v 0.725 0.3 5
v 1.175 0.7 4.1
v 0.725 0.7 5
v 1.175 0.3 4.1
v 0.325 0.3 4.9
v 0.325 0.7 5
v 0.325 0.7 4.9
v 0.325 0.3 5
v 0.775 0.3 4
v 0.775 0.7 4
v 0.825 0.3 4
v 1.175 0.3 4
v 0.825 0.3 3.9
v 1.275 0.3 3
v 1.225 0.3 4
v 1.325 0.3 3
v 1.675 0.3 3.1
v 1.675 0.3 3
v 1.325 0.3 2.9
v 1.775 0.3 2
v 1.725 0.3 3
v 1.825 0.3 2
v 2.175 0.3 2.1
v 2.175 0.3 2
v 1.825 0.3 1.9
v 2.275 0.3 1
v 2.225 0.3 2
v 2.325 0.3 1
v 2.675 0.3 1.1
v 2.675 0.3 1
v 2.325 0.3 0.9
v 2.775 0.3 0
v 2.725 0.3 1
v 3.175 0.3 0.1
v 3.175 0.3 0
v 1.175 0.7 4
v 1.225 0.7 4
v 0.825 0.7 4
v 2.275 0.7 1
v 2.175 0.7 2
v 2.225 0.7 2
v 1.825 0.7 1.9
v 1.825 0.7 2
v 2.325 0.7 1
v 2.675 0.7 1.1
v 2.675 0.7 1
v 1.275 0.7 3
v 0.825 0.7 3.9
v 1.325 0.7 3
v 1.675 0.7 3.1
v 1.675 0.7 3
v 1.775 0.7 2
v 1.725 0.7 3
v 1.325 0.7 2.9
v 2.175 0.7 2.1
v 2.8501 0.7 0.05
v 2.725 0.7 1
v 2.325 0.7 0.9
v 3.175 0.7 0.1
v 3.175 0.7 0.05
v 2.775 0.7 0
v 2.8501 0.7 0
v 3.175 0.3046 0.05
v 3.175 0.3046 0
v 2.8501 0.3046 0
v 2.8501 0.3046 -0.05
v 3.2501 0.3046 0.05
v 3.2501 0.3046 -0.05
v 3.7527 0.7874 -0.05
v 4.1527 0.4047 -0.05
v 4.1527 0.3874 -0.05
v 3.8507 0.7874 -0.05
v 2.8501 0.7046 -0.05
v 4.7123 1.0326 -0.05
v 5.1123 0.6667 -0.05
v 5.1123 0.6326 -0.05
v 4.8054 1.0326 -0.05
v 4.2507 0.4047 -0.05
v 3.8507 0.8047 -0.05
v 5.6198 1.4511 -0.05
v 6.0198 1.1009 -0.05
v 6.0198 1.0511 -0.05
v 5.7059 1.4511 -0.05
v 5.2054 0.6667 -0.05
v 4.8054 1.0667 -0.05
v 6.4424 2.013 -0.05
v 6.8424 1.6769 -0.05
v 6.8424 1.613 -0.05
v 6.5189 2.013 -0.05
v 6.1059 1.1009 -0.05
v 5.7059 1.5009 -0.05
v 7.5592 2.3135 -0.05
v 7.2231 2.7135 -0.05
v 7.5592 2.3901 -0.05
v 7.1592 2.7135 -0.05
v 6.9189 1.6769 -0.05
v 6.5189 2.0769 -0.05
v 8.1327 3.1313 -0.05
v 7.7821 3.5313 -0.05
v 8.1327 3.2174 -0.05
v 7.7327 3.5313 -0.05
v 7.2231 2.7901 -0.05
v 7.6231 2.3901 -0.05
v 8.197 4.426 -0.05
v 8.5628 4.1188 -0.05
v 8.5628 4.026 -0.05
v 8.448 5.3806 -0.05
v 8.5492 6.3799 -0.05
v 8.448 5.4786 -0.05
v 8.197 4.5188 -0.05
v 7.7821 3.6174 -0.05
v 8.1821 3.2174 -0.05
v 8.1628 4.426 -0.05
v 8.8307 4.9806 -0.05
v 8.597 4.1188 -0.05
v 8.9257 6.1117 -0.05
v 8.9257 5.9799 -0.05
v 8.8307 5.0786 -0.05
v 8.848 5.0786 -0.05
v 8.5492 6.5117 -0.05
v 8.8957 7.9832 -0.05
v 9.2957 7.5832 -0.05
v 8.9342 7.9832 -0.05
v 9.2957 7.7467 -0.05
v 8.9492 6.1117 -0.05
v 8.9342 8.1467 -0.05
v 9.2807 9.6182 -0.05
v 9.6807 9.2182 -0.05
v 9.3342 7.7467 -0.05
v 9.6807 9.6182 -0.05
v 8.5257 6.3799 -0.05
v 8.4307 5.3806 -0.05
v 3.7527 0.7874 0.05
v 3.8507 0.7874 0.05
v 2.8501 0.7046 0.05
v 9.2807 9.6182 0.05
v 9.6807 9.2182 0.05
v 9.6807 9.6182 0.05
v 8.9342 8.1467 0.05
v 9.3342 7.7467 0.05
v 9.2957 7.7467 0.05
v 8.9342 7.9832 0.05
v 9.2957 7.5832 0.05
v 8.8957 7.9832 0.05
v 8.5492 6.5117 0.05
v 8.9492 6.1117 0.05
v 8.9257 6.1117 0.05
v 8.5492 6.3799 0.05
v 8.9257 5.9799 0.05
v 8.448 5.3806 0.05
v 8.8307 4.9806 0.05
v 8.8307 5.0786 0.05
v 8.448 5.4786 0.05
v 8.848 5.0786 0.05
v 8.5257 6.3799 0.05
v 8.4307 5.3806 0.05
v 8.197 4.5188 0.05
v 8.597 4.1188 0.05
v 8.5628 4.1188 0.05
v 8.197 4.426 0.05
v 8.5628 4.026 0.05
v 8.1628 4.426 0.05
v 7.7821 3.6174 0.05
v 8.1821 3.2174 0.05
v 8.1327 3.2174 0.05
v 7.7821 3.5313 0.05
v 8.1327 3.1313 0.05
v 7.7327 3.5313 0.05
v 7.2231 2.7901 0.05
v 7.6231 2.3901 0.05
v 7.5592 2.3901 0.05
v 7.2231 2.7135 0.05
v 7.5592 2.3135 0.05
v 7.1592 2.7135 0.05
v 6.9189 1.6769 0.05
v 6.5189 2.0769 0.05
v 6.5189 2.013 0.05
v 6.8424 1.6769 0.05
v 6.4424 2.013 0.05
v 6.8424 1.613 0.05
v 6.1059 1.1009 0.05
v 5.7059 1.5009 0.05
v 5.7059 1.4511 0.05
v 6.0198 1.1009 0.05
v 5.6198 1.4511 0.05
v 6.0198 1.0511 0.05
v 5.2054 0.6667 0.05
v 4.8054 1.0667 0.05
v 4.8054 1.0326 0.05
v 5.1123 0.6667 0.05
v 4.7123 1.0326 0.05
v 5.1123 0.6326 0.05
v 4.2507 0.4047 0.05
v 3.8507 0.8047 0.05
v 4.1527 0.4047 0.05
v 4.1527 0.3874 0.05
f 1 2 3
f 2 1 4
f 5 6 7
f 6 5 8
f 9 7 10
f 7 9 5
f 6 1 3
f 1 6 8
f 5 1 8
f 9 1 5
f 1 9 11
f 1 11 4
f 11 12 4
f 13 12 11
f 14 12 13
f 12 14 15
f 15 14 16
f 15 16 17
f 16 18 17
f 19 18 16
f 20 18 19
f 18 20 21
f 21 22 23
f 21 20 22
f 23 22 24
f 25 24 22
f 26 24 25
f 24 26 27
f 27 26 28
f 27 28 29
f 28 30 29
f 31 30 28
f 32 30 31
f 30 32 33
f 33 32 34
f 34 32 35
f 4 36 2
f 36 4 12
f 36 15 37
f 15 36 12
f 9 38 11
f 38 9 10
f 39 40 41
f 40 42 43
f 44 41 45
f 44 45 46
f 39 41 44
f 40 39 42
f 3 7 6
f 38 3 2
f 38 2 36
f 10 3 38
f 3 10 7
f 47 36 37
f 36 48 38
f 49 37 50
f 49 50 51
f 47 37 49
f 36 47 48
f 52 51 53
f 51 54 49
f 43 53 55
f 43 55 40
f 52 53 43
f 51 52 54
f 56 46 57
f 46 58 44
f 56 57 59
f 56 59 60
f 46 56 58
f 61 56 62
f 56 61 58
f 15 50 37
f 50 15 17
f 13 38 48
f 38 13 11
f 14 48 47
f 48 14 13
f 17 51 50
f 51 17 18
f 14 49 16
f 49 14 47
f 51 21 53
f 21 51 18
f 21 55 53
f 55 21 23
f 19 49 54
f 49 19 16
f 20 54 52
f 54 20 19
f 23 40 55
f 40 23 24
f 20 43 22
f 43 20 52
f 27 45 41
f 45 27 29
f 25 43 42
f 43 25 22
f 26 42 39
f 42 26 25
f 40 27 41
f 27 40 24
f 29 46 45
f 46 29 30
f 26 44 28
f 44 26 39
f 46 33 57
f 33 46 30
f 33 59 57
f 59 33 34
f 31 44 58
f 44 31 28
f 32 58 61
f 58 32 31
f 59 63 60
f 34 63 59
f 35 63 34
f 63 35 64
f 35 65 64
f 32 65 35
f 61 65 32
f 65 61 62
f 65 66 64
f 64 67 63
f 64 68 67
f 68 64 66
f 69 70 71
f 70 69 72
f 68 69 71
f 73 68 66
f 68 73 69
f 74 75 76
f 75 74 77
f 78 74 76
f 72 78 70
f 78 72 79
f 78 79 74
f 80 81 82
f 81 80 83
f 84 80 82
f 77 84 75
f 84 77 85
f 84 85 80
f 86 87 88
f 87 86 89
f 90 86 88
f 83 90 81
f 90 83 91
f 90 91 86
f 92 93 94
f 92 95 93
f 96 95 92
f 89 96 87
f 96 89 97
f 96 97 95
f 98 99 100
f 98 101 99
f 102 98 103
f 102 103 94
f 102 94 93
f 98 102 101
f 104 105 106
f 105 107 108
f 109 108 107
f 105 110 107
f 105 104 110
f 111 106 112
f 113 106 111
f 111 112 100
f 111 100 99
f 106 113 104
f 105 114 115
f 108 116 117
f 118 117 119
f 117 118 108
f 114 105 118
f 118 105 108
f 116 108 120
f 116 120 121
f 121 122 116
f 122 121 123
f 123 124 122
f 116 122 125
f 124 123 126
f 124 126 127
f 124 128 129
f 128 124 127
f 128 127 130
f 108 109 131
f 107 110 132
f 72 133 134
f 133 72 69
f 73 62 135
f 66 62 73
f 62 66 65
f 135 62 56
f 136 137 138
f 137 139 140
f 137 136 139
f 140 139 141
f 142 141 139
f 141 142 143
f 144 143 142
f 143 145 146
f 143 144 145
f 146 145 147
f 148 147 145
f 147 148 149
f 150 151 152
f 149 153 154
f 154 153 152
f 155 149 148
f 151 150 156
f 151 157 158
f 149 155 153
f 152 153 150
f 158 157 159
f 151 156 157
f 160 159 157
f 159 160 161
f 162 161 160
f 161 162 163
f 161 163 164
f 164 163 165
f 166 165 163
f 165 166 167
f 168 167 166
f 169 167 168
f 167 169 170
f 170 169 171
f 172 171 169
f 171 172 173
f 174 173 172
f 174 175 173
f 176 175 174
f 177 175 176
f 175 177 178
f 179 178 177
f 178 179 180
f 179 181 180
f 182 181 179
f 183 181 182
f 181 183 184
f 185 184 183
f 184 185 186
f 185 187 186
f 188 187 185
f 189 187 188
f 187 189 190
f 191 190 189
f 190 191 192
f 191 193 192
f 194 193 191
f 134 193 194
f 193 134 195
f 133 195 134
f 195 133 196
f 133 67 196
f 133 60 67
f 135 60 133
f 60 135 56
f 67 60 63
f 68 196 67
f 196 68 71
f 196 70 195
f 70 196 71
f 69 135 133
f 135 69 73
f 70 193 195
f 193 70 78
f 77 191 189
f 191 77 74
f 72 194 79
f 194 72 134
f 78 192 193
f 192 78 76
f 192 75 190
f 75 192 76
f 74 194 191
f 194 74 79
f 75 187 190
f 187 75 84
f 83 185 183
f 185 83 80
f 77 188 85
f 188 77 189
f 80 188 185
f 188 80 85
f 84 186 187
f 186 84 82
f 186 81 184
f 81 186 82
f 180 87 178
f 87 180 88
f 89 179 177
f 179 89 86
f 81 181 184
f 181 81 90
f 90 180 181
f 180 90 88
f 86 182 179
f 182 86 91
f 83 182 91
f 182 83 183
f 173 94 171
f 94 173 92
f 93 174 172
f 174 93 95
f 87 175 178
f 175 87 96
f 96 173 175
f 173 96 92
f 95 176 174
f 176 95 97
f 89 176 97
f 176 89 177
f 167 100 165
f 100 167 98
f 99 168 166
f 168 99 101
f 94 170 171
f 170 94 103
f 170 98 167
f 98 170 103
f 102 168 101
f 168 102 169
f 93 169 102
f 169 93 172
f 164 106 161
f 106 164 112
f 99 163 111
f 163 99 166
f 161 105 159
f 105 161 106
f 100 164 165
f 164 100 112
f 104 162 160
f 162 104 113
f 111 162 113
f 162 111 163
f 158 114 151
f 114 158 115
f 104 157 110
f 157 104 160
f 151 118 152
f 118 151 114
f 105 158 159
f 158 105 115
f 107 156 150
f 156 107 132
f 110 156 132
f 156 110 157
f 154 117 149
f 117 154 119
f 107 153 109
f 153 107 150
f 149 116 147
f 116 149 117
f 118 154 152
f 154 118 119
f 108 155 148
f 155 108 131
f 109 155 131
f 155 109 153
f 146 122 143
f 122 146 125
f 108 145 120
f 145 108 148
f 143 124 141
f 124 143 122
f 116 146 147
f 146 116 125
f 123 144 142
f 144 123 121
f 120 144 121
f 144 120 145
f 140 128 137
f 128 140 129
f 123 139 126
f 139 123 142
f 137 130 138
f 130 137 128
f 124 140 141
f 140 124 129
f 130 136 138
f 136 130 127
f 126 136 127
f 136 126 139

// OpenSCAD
hull() {
    translate([0.525, 0.5, 4.95]) cube([0.4, 0.4, 0.1], center=true);
    translate([0.9750000000000001, 0.5, 4.05]) cube([0.4, 0.4, 0.1], center=true);
}


hull() {
    translate([1.025, 0.5, 3.95]) cube([0.4, 0.4, 0.1], center=true);
    translate([1.475, 0.5, 3.0500000000000003]) cube([0.4, 0.4, 0.1], center=true);
}


hull() {
    translate([1.5250000000000001, 0.5, 2.95]) cube([0.4, 0.4, 0.1], center=true);
    translate([1.975, 0.5, 2.05]) cube([0.4, 0.4, 0.1], center=true);
}


hull() {
    translate([2.025, 0.5, 1.9500000000000002]) cube([0.4, 0.4, 0.1], center=true);
    translate([2.475, 0.5, 1.05]) cube([0.4, 0.4, 0.1], center=true);
}


hull() {
    translate([2.525, 0.5, 0.9500000000000001]) cube([0.4, 0.4, 0.1], center=true);
    translate([2.975, 0.5, 0.05]) cube([0.4, 0.4, 0.1], center=true);
}


hull() {
    translate([3.0501400000000003, 0.5046, 0.0]) cube([0.4, 0.4, 0.1], center=true);
    translate([3.95266, 0.5873999999999999, 0.0]) cube([0.4, 0.4, 0.1], center=true);
}


hull() {
    translate([4.05067, 0.6046649999999999, 0.0]) cube([0.4, 0.4, 0.1], center=true);
    translate([4.912330000000001, 0.832635, 0.0]) cube([0.4, 0.4, 0.1], center=true);
}


hull() {
    translate([5.005440000000001, 0.8666600000000001, 0.0]) cube([0.4, 0.4, 0.1], center=true);
    translate([5.8197600000000005, 1.2511400000000001, 0.0]) cube([0.4, 0.4, 0.1], center=true);
}


hull() {
    translate([5.905915, 1.30095, 0.0]) cube([0.4, 0.4, 0.1], center=true);
    translate([6.642385, 1.8130499999999998, 0.0]) cube([0.4, 0.4, 0.1], center=true);
}


hull() {
    translate([6.718875, 1.8768699999999998, 0.0]) cube([0.4, 0.4, 0.1], center=true);
    translate([7.359225, 2.5135300000000003, 0.0]) cube([0.4, 0.4, 0.1], center=true);
}


hull() {
    translate([7.42311, 2.59008, 0.0]) cube([0.4, 0.4, 0.1], center=true);
    translate([7.93269, 3.33132, 0.0]) cube([0.4, 0.4, 0.1], center=true);
}


hull() {
    translate([7.982150000000001, 3.41742, 0.0]) cube([0.4, 0.4, 0.1], center=true);
    translate([8.36285, 4.225980000000001, 0.0]) cube([0.4, 0.4, 0.1], center=true);
}


hull() {
    translate([8.396985, 4.31878, 0.0]) cube([0.4, 0.4, 0.1], center=true);
    translate([8.630715, 5.18062, 0.0]) cube([0.4, 0.4, 0.1], center=true);
}


hull() {
    translate([8.648015000000001, 5.278575, 0.0]) cube([0.4, 0.4, 0.1], center=true);
    translate([8.725685, 6.179925, 0.0]) cube([0.4, 0.4, 0.1], center=true);
}


hull() {
    translate([8.74925, 6.31175, 0.0]) cube([0.4, 0.4, 0.1], center=true);
    translate([9.09575, 7.78325, 0.0]) cube([0.4, 0.4, 0.1], center=true);
}


hull() {
    translate([9.13425, 7.94675, 0.0]) cube([0.4, 0.4, 0.1], center=true);
    translate([9.48075, 9.41825, 0.0]) cube([0.4, 0.4, 0.1], center=true);
}
